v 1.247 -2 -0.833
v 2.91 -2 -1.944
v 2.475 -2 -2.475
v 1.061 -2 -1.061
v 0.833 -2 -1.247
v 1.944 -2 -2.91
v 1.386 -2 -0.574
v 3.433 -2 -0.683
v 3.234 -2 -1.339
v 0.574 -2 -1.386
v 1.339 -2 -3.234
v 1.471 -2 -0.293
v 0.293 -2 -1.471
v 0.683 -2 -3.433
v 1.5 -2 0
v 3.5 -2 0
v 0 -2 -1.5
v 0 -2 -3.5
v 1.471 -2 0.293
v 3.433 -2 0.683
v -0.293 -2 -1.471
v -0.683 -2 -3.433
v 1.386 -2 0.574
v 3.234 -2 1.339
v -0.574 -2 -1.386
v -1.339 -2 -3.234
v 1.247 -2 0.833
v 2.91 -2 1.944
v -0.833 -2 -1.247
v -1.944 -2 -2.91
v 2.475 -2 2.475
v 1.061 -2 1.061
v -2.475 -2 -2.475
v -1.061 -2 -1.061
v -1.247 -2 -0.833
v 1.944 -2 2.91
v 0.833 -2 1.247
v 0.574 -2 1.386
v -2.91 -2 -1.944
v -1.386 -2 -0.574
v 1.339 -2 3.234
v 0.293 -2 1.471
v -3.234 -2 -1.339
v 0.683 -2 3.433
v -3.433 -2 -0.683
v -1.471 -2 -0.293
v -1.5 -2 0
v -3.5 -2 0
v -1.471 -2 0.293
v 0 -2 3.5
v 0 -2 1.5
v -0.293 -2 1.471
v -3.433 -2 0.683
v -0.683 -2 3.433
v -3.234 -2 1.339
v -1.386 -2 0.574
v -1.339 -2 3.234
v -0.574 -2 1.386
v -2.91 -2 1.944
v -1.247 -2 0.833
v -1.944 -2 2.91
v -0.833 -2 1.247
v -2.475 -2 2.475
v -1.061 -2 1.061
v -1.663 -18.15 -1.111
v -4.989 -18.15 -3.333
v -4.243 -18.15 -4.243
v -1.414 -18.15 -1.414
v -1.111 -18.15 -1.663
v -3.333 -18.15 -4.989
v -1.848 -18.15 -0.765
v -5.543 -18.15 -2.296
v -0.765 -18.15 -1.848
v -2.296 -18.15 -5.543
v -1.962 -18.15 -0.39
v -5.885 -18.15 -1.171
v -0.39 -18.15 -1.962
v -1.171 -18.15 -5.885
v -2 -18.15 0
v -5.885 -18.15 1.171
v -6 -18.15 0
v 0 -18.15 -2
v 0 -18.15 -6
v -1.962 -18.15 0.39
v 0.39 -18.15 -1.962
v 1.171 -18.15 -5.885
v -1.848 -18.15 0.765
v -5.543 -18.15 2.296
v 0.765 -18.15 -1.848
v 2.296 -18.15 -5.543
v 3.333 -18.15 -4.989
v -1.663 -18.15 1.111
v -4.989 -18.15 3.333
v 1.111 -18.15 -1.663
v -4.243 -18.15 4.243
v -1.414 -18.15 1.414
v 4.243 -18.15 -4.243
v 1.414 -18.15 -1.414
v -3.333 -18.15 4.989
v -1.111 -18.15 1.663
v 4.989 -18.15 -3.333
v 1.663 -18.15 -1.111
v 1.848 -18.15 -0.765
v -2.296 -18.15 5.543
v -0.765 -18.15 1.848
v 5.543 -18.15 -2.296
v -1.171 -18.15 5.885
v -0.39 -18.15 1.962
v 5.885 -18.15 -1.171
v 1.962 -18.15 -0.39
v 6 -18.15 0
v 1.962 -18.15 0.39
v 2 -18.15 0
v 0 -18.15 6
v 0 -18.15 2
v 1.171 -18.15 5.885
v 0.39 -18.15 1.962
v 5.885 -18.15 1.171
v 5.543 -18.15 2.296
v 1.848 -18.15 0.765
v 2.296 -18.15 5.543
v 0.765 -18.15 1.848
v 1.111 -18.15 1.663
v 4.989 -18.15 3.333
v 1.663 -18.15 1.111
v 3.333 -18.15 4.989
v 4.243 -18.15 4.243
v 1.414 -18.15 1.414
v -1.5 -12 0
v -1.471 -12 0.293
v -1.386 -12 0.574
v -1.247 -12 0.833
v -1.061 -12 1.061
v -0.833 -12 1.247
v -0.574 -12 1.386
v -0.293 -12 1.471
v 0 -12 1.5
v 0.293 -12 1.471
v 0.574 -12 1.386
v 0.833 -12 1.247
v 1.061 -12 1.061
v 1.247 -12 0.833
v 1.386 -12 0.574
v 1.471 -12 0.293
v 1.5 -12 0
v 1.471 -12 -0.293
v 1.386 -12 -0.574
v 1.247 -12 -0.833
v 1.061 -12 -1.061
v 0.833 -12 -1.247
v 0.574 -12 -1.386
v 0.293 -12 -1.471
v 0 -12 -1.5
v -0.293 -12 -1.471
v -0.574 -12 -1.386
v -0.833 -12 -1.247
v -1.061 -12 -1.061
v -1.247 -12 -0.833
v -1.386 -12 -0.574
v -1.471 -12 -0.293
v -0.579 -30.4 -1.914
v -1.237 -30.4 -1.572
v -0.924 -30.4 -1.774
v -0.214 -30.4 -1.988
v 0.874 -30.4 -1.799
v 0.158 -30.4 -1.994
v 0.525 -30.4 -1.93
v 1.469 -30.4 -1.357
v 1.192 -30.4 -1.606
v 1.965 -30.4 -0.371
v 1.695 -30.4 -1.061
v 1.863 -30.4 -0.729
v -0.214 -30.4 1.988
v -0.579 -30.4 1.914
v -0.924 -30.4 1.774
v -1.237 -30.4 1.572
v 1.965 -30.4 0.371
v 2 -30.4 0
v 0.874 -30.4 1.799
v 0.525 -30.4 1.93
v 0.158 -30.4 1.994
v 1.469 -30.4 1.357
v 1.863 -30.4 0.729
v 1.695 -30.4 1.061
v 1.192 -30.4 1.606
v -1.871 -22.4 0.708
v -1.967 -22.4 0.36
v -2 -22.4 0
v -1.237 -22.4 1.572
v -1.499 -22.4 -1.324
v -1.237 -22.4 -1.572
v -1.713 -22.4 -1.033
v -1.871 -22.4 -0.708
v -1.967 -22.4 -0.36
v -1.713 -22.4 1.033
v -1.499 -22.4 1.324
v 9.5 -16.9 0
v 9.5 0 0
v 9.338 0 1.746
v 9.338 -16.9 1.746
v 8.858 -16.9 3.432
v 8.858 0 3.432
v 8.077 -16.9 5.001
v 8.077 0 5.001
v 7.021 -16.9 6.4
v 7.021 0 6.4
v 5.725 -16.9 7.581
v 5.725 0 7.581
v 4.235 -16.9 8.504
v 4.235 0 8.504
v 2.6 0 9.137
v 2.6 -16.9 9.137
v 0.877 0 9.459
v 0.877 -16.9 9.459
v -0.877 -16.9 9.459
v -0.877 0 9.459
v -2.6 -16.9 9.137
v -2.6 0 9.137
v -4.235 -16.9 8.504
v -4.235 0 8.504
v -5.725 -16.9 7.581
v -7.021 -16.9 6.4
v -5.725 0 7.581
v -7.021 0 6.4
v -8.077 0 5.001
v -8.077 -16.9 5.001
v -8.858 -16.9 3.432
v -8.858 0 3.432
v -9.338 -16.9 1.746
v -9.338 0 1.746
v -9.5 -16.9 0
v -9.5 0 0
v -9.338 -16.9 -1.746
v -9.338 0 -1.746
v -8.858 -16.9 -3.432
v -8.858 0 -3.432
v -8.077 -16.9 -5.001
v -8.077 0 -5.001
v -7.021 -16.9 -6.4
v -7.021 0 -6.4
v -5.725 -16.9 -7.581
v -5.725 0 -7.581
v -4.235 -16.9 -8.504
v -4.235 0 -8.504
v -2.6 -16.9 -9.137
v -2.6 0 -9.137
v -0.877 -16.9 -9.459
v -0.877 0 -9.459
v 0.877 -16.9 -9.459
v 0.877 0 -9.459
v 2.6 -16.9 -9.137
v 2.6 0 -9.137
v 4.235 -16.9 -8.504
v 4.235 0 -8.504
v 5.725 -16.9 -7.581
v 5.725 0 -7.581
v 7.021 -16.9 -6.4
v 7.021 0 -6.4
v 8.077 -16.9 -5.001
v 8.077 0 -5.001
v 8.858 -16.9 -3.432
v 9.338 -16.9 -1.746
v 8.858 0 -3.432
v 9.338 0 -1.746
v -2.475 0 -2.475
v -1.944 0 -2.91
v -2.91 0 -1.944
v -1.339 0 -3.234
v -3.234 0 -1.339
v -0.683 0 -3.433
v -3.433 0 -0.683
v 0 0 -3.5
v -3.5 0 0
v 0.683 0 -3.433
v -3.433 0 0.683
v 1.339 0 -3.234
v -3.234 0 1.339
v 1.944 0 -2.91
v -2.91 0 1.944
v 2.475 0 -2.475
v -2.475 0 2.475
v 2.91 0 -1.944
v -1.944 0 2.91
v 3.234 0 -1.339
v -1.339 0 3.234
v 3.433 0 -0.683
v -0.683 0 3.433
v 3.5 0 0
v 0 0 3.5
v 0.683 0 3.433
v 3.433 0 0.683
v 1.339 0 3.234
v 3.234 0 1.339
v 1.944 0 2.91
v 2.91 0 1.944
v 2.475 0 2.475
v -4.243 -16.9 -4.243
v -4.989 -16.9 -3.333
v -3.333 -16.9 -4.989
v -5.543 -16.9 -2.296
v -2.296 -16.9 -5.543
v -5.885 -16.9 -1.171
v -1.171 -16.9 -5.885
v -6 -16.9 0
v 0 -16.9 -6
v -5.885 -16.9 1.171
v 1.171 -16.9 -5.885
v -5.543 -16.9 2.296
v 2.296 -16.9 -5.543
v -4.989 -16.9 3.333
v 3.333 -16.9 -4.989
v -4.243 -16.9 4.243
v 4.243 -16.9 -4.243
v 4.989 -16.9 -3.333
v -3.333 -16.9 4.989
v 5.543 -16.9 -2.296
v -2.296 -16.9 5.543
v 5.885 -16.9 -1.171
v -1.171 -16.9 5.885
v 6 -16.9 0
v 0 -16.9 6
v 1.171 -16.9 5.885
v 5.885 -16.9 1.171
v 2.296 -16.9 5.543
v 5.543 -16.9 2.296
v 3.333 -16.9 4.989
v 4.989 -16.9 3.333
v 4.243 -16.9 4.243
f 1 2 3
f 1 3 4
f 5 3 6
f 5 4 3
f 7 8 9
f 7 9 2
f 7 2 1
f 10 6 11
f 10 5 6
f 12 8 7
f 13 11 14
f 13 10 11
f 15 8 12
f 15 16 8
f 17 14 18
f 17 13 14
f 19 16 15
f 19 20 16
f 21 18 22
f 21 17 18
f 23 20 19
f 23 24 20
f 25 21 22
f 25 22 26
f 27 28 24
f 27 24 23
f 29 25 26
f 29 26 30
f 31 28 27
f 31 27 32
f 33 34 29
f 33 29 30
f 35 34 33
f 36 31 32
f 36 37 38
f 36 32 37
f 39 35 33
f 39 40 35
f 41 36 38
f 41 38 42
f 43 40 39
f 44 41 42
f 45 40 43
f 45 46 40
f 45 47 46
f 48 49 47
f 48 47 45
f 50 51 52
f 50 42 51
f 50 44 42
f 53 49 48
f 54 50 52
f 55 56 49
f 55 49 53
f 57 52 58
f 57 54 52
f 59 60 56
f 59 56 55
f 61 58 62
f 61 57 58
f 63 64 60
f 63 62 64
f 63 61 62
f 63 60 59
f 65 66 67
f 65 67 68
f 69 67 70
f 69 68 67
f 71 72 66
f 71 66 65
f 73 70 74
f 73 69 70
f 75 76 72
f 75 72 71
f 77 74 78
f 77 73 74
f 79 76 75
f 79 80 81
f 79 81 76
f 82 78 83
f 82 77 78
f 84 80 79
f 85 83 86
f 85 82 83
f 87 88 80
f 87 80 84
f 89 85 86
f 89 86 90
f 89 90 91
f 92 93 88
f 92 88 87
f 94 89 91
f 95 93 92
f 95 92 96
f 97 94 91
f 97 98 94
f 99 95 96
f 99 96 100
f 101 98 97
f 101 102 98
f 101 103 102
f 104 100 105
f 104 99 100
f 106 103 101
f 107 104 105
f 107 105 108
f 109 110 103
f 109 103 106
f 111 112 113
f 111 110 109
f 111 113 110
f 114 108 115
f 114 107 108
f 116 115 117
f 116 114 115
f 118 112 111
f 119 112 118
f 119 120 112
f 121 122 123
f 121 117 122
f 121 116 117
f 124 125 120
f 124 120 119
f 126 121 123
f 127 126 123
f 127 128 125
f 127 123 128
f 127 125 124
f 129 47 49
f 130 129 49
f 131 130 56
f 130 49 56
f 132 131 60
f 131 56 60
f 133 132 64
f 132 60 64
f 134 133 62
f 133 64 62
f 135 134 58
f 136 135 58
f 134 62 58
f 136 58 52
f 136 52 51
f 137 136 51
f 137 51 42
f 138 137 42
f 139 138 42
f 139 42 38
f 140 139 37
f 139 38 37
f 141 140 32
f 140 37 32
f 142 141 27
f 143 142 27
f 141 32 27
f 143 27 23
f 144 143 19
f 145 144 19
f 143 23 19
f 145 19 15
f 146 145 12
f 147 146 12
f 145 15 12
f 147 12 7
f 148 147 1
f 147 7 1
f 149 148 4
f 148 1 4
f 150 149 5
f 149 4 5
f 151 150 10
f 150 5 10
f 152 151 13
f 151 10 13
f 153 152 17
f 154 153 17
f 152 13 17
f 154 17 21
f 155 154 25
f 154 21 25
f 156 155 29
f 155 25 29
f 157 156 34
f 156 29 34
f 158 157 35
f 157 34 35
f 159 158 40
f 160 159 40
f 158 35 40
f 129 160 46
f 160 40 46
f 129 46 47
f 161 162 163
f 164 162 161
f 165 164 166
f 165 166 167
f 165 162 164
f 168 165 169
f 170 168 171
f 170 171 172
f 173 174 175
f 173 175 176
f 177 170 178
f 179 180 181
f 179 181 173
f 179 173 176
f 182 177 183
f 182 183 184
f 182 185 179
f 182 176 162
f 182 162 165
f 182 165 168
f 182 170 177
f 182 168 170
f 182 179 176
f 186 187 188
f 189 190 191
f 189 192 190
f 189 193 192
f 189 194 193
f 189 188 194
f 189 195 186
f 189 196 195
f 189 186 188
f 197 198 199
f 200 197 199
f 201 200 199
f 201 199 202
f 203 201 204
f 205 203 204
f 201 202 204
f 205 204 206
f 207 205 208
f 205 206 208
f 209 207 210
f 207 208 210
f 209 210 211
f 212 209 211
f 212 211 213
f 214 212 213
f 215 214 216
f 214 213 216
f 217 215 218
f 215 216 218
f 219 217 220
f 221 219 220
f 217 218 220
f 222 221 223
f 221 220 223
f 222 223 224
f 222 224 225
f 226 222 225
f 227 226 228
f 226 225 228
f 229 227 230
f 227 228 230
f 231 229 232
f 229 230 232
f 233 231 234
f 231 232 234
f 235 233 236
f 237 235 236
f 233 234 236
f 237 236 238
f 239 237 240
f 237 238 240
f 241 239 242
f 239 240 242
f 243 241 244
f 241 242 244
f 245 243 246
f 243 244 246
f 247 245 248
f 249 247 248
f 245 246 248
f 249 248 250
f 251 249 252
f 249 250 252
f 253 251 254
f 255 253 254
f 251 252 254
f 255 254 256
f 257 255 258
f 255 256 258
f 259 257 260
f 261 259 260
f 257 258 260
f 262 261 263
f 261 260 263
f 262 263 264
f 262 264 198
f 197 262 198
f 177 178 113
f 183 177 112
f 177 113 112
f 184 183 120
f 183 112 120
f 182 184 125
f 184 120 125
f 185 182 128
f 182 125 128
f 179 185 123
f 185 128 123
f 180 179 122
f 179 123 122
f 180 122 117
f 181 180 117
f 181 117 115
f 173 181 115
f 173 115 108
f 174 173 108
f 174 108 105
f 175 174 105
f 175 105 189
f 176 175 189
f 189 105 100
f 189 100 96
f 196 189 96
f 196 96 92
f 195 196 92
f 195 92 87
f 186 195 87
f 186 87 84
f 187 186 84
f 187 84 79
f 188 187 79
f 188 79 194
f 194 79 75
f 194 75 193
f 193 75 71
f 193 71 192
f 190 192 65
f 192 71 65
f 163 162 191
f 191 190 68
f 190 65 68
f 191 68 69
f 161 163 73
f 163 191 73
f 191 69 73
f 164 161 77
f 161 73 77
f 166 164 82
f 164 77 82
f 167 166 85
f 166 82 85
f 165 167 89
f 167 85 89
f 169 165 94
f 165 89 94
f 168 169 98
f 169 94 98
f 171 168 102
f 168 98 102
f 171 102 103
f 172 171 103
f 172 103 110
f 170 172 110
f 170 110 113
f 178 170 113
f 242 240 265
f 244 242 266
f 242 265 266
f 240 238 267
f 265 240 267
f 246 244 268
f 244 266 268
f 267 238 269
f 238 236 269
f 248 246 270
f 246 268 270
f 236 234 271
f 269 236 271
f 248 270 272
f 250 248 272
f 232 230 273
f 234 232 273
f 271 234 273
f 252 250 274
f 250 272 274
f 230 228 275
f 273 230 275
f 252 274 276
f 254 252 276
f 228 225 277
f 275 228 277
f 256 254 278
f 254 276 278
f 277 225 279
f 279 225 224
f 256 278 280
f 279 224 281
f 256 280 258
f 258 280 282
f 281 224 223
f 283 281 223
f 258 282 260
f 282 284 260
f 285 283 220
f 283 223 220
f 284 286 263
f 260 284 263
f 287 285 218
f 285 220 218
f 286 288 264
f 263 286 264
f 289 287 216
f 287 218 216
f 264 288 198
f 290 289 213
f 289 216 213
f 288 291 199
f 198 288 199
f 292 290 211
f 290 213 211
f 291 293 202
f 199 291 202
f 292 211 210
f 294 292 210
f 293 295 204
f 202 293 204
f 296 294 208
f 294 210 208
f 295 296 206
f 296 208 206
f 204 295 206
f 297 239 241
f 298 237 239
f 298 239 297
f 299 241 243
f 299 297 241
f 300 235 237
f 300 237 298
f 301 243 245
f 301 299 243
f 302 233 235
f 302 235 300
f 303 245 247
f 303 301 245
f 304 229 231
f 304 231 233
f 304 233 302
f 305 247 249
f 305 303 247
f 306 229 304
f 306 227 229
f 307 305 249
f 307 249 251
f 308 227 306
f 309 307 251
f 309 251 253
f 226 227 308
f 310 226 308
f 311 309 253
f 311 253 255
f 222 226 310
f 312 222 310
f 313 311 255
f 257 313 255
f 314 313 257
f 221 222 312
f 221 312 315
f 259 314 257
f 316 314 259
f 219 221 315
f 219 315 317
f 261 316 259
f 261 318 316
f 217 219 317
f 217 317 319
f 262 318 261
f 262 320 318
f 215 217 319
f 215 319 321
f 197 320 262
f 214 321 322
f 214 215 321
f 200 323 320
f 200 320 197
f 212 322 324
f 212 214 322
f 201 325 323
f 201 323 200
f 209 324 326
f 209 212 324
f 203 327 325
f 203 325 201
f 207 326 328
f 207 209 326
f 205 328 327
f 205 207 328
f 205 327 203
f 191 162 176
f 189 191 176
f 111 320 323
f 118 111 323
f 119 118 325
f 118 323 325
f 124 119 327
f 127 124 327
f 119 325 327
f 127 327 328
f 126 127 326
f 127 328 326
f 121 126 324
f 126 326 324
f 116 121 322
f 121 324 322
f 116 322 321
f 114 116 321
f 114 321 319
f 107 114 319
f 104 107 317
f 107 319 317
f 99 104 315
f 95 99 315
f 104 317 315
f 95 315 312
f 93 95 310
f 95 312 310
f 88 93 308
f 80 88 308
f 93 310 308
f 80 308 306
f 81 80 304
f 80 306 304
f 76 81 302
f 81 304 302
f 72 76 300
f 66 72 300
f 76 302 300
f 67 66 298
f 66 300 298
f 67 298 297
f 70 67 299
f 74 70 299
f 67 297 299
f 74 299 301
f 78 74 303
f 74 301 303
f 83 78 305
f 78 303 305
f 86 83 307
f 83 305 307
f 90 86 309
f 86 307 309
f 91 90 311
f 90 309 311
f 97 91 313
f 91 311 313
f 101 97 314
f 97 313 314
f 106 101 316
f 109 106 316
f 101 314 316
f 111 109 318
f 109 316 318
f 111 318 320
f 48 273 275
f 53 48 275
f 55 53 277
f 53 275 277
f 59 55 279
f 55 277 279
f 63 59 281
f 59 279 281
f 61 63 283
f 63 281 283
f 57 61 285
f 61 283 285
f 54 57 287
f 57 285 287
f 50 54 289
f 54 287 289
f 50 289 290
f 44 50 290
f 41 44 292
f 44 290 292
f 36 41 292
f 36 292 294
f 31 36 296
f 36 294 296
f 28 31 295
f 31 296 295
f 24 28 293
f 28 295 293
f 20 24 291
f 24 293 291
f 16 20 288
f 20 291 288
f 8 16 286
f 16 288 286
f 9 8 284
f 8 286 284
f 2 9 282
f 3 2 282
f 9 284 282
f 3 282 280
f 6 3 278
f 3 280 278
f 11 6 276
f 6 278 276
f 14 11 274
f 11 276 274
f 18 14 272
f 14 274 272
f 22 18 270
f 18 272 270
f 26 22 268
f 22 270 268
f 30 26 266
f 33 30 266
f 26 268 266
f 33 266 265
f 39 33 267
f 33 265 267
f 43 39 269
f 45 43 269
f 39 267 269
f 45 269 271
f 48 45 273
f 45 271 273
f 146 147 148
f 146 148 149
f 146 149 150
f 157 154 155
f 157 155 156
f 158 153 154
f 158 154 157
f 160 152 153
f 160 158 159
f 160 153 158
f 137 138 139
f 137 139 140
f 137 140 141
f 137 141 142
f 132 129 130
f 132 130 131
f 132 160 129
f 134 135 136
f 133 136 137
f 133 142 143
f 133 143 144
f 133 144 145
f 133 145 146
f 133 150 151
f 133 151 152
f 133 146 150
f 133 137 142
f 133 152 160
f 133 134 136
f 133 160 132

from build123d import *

# Parameters (mm, degrees)
F0_R      = 9.5
F1_DEPTH  = 16.9
F2_R      = 6
F3_DEPTH  = 1.25
F4_R      = 2
F5_DEPTH  = 12.25
F6_W      = 1.523732
F6_H      = 5.739091
F7_DEPTH  = 8
F8_R      = 3.5
F9_DEPTH  = 2
F10_R     = 1.5
F11_DEPTH = 10


with BuildPart() as f1:
    # F0 (on Front) → F1 (new body)
    with BuildSketch(Plane.XZ):
        Circle(F0_R)
    extrude(amount=F1_DEPTH)

    # F2 (on face) → F3 (join)
    with BuildSketch(Plane.XZ.offset(16.9)):
        Circle(F2_R)
    extrude(amount=F3_DEPTH)

    # F4 (on face) → F5 (join)
    with BuildSketch(Plane.XZ.offset(18.15)):
        Circle(F4_R)
    extrude(amount=F5_DEPTH)

    # F6 (on face) → F7 (cut)
    with BuildSketch(Plane.XZ.offset(30.4)):
        with Locations((-1.998623, 0.154332)):
            Rectangle(F6_W, F6_H)
    extrude(amount=-F7_DEPTH, mode=Mode.SUBTRACT)

    # F8 (on face) → F9 (cut)
    with BuildSketch(Plane(origin=(0, 0, 0), x_dir=(-1, 0, 0), z_dir=(0, 1, 0))):
        Circle(F8_R)
    extrude(amount=-F9_DEPTH, mode=Mode.SUBTRACT)

    # F10 (on face) → F11 (cut)
    with BuildSketch(Plane(origin=(0, -2, 0), x_dir=(-1, 0, 0), z_dir=(0, 1, 0))):
        Circle(F10_R)
    extrude(amount=-F11_DEPTH, mode=Mode.SUBTRACT)


solid = f1.part
